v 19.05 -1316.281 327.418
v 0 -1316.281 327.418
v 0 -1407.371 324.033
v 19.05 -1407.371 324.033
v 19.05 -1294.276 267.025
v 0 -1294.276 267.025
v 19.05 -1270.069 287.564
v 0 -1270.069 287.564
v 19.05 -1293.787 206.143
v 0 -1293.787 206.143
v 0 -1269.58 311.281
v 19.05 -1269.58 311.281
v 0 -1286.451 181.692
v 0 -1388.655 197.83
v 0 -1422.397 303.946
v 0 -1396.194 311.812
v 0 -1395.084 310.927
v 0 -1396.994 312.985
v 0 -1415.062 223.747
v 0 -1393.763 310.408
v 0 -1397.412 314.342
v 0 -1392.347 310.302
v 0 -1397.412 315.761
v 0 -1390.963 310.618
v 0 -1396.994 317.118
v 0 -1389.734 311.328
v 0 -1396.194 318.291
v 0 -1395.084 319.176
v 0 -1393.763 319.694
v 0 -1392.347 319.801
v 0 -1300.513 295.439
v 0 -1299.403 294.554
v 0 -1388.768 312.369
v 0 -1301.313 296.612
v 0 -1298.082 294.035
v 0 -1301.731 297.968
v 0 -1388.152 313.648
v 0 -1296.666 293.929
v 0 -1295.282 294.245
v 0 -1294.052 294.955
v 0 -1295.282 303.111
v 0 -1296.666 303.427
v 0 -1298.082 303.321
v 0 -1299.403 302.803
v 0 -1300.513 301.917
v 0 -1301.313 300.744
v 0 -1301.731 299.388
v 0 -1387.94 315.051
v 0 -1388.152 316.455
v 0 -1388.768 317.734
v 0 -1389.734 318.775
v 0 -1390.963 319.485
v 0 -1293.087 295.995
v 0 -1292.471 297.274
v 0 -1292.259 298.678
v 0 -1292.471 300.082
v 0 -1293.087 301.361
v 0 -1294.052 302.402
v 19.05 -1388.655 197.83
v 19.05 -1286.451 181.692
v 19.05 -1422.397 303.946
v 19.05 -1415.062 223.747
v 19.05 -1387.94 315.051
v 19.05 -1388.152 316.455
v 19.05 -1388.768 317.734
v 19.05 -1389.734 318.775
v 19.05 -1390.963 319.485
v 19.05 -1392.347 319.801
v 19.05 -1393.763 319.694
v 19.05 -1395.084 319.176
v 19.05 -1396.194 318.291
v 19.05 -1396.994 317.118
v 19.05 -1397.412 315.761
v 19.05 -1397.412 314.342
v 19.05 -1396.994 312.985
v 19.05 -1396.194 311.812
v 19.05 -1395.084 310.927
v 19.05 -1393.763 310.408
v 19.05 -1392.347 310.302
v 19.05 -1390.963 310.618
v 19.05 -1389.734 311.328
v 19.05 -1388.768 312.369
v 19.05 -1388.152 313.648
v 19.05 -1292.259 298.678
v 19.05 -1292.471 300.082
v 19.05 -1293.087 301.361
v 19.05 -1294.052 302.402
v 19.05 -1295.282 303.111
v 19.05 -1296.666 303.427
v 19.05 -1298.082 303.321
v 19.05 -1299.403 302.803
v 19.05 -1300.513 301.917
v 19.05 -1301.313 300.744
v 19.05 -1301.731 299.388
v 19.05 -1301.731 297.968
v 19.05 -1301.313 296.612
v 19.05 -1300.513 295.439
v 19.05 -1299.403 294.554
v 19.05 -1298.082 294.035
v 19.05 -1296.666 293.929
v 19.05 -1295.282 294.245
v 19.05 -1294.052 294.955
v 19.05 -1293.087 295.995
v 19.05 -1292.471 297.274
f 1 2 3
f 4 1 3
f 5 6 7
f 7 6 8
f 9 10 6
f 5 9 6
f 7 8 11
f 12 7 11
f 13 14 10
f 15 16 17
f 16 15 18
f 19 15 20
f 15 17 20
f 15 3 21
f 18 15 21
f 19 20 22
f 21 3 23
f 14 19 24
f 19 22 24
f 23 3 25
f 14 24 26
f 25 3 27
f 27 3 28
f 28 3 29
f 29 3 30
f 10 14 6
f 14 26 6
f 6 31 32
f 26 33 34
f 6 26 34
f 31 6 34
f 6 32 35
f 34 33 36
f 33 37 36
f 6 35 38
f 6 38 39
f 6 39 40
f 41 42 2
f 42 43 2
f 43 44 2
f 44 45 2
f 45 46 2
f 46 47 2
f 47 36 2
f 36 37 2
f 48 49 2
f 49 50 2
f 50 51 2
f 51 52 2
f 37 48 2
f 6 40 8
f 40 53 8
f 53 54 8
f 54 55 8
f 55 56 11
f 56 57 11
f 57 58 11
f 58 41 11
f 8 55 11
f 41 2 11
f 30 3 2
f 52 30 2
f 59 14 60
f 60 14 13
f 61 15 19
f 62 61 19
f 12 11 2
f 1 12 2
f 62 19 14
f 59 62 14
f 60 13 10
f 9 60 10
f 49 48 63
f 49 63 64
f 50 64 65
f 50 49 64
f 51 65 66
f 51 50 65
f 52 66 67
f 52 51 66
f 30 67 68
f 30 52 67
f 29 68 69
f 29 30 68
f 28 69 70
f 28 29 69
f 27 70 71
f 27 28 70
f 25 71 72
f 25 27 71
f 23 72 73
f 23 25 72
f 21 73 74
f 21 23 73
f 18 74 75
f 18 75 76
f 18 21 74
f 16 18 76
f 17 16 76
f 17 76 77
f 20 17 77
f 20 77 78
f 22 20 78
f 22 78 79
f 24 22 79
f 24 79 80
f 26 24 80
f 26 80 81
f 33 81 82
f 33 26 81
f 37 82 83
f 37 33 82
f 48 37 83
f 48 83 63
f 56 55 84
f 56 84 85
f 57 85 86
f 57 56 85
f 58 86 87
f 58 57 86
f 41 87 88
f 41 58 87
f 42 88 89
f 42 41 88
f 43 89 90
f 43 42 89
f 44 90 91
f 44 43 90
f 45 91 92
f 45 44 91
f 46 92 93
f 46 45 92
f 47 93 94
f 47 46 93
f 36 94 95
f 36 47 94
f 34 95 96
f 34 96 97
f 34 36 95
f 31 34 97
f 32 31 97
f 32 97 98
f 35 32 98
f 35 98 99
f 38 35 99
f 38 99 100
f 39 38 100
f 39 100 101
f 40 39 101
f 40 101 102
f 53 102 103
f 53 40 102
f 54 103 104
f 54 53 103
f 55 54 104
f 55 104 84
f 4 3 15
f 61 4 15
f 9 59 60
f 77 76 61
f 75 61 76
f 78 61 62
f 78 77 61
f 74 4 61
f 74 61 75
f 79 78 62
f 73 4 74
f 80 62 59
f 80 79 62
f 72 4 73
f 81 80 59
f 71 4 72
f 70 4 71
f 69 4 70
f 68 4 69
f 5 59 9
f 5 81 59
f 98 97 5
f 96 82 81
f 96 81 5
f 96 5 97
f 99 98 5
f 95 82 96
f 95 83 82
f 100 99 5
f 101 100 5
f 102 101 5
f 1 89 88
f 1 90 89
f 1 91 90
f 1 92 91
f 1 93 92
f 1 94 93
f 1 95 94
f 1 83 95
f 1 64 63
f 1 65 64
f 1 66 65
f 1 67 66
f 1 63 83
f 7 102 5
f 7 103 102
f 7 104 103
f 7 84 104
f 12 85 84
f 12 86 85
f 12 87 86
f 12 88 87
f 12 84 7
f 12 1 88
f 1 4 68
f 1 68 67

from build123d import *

# Parameters (mm, degrees)
F2_R     = 4.7625
F3_DEPTH = 19.05


with BuildPart() as f3:
    # F2 (on Right) → F3 (new body)
    with BuildSketch(Plane.YZ):
        Polygon((-1407.371283, 324.033141), (-1422.397137, 303.945631), (-1415.061831, 223.747462), (-1388.655186, 197.829768), (-1286.451459, 181.692332), (-1293.786645, 206.142992), (-1294.275641, 267.025113), (-1270.06948, 287.563682), (-1269.580483, 311.280817), (-1316.281199, 327.418238), align=None)
        with Locations((-1392.702985, 315.051372)):
            Circle(F2_R, mode=Mode.SUBTRACT)
        with Locations((-1297.021795, 298.678095)):
            Circle(F2_R, mode=Mode.SUBTRACT)
    extrude(amount=F3_DEPTH)


solid = f3.part
